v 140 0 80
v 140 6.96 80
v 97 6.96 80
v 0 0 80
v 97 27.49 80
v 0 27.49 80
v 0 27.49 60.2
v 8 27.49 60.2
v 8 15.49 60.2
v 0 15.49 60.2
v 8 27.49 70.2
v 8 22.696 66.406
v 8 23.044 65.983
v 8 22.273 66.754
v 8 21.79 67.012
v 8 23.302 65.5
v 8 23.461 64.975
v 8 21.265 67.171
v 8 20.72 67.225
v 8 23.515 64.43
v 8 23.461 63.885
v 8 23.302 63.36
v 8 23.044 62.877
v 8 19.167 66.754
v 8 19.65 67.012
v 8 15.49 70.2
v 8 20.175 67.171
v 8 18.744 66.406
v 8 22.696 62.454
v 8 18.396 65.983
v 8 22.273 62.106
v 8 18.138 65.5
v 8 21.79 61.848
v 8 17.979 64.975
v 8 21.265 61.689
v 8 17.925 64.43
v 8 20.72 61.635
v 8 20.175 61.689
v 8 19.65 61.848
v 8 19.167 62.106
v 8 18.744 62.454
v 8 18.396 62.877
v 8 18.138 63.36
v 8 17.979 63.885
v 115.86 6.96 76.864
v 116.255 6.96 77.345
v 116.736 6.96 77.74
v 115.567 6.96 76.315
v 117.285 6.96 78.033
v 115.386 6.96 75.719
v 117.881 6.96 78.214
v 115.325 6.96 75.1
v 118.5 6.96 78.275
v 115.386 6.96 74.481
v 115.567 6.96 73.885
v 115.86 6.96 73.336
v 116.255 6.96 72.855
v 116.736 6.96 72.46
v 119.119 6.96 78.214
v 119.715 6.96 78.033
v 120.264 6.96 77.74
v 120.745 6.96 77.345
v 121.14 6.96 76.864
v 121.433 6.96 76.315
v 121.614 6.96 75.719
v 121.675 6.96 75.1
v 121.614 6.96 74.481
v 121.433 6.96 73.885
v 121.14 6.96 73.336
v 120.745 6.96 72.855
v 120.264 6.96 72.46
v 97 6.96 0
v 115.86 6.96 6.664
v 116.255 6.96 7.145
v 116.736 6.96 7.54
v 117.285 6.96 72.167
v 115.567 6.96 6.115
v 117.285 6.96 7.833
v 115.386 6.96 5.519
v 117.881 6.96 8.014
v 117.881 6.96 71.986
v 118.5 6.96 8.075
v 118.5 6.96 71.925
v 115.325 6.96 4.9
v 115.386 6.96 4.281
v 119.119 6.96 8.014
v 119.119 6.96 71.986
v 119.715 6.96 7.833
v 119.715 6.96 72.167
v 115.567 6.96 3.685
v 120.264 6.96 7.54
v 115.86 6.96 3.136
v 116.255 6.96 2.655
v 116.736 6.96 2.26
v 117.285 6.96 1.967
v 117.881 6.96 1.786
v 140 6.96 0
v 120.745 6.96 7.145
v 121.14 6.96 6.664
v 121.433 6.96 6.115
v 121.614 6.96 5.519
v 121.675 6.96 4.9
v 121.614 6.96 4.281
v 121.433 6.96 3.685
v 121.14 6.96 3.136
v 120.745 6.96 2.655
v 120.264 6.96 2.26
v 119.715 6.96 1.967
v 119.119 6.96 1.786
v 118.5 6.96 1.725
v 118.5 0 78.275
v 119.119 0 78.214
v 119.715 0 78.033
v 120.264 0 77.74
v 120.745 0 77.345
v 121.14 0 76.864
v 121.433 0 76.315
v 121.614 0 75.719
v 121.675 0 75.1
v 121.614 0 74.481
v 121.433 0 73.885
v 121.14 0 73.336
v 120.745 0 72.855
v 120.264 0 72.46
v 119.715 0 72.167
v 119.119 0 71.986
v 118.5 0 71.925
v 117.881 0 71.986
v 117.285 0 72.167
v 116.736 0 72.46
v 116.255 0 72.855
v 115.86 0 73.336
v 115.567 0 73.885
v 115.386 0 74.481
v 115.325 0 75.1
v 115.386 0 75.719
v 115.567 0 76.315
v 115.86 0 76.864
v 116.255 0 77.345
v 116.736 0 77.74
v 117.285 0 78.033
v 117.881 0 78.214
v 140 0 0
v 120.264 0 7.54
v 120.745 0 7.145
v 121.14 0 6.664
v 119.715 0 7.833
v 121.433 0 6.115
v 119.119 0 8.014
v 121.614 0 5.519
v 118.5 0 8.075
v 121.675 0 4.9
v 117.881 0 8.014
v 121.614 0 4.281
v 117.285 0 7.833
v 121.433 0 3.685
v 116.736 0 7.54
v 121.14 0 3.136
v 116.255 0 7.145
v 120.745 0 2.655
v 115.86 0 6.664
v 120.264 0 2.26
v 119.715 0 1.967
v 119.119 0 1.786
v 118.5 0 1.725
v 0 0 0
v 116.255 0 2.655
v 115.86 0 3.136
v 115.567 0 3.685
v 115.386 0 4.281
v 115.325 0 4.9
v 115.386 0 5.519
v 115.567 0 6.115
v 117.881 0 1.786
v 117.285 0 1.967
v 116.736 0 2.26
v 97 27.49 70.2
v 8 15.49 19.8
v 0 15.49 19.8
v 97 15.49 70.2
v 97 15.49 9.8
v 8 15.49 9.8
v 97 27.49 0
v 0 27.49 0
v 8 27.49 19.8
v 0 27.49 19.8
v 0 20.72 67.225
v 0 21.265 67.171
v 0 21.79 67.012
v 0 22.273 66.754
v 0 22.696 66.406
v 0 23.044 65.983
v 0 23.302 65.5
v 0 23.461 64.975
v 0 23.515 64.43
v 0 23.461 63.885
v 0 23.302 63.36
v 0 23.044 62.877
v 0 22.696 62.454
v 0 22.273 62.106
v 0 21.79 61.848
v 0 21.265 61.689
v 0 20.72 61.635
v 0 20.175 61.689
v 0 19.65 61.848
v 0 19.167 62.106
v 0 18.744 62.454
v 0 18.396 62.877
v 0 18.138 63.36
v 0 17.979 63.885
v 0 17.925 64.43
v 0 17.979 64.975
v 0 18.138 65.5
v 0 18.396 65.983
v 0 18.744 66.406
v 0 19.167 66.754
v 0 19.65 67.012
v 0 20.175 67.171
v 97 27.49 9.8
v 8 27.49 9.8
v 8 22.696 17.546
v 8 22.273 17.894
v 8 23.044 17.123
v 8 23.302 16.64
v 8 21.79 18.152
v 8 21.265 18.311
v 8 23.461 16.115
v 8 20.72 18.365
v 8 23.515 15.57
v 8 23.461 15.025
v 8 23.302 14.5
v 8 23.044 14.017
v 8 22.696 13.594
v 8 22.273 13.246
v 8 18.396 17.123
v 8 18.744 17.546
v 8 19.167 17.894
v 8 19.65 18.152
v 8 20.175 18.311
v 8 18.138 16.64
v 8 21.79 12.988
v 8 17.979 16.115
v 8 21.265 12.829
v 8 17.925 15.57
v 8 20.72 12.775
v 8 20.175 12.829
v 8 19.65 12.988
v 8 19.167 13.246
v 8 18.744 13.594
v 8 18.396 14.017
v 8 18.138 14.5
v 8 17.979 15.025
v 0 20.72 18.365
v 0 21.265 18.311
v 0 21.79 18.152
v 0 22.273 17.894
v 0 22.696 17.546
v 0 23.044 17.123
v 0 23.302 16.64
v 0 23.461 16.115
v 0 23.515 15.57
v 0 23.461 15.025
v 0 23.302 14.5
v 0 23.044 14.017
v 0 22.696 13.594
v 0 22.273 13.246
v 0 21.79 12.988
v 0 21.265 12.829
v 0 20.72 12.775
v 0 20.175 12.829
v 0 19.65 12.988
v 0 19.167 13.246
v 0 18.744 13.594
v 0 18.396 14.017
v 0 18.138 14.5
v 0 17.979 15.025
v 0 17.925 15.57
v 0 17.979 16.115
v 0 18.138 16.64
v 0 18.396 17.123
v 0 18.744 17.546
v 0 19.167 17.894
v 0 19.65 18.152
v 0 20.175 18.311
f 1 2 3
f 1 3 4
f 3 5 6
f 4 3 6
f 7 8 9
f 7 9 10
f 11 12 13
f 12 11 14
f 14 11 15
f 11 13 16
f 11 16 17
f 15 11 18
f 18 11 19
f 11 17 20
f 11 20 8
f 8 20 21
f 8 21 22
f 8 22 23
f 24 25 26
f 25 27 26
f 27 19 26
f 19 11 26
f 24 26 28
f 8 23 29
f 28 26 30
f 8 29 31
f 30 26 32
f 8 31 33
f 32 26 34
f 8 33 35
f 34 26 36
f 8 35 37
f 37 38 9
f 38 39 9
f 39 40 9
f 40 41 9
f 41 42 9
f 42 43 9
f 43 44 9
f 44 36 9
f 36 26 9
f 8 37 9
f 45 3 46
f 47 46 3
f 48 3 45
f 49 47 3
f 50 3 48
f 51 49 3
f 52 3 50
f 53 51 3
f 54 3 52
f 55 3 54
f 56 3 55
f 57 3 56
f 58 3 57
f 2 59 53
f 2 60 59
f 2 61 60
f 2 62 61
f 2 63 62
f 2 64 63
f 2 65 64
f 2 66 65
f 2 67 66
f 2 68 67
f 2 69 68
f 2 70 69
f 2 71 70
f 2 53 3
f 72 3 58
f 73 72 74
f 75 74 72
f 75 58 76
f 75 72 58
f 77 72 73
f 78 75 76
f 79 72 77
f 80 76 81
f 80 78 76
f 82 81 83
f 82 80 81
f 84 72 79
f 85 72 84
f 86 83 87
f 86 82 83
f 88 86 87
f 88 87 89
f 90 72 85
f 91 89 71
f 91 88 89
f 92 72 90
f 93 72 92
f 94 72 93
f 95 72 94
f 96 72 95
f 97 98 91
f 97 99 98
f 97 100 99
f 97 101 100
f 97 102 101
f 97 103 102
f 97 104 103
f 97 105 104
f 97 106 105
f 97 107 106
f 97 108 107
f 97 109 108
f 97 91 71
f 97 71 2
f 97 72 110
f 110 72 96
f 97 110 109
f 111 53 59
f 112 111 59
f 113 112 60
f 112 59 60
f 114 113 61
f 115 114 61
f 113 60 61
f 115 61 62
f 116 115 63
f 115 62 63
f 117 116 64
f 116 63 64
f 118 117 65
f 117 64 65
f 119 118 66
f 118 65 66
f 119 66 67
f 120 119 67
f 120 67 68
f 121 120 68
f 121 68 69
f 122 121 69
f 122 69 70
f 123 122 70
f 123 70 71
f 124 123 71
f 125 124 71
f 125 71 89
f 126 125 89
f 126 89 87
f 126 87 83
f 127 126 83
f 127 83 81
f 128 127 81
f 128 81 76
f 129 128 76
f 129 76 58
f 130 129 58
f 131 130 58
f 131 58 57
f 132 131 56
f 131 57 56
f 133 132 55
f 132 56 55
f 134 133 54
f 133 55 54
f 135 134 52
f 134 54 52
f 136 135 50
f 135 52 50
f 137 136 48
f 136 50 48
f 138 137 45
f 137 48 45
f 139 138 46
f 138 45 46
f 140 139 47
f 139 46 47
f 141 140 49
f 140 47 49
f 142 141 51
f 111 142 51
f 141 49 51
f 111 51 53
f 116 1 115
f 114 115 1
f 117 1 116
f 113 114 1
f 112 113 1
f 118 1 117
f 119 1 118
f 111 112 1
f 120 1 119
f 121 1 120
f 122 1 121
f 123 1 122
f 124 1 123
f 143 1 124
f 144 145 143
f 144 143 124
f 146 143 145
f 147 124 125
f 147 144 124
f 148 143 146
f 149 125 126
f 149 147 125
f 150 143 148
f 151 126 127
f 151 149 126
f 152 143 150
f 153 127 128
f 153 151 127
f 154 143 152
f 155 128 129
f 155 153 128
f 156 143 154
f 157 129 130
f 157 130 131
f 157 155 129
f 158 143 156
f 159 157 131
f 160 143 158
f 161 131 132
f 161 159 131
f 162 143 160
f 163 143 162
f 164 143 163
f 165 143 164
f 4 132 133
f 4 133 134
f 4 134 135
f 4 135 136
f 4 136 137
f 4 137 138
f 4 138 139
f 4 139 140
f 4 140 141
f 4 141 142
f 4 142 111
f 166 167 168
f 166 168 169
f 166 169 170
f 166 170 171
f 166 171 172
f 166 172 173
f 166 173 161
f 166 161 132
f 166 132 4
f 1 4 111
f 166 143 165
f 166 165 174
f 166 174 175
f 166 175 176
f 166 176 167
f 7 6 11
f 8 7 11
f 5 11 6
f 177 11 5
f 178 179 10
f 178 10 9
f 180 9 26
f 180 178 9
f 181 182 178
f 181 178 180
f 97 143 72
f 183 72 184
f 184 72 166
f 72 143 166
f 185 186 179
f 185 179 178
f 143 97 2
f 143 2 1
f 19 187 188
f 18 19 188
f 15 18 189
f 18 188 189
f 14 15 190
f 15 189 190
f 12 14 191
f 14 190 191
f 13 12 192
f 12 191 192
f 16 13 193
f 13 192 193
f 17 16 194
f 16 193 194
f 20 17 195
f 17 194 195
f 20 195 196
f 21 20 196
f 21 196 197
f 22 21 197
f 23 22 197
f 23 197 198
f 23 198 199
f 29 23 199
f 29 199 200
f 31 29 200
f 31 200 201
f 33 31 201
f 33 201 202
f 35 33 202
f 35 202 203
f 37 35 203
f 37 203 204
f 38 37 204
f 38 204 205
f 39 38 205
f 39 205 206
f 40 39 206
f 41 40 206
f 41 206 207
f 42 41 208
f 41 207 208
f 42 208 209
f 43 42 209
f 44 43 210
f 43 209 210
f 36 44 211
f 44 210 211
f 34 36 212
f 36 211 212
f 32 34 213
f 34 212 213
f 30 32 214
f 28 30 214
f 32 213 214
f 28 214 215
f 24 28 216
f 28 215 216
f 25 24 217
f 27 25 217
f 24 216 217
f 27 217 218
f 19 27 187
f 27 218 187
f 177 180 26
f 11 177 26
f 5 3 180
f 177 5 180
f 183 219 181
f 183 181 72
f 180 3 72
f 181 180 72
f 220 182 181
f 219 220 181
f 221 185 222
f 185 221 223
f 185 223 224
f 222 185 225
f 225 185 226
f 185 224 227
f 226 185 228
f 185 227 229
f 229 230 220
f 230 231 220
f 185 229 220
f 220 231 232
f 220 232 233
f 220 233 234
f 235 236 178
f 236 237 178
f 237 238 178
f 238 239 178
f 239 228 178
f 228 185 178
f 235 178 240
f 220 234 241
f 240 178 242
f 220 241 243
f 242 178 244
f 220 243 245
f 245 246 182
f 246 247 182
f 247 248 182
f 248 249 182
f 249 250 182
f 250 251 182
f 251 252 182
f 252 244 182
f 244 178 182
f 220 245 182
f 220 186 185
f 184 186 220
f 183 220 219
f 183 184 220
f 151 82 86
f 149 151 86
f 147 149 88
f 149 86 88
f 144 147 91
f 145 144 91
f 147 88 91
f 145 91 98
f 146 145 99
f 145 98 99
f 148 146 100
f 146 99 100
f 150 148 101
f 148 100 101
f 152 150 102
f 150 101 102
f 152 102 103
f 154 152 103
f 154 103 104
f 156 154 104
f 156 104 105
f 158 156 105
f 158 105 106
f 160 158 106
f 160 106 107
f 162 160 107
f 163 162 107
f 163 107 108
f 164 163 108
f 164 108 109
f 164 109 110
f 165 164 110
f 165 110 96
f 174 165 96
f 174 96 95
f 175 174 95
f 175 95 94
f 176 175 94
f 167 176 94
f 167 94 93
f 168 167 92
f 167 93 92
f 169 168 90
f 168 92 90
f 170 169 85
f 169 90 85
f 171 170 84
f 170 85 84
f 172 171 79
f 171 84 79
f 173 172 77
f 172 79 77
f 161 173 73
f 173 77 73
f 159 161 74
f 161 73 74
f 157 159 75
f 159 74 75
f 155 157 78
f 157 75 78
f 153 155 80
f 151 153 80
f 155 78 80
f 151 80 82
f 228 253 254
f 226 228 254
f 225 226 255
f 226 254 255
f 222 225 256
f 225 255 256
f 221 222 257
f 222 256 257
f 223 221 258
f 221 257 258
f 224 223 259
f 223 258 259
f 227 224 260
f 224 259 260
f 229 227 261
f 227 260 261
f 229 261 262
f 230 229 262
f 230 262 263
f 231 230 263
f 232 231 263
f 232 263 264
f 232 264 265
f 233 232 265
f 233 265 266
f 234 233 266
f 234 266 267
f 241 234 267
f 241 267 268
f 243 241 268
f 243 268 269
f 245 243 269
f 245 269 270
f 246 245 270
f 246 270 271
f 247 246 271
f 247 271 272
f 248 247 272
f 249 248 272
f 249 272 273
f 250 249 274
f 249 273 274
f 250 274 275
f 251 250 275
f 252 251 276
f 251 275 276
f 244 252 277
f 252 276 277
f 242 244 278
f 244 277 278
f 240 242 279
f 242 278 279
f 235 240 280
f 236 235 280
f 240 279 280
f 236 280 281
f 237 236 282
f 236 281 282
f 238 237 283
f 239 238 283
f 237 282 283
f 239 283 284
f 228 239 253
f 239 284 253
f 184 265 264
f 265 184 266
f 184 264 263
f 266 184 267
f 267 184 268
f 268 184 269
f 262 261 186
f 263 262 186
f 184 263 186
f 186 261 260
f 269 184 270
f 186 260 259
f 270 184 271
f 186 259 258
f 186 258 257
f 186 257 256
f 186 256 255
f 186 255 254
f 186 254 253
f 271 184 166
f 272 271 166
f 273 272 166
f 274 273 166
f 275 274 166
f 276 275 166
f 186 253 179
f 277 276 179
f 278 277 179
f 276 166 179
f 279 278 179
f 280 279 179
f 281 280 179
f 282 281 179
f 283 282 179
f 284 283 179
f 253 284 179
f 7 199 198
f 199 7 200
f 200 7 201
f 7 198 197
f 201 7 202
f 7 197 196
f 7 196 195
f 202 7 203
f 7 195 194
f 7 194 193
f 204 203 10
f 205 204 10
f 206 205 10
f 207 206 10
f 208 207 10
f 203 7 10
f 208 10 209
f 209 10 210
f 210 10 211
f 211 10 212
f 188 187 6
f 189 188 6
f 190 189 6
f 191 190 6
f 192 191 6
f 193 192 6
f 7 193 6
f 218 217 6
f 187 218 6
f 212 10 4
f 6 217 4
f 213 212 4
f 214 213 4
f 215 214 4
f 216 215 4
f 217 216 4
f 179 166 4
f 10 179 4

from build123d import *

# Parameters (mm, degrees)
BOSS_EXTRUDE1_DEPTH = 80
BOSS_EXTRUDE2_DEPTH = 12
SKETCH3_R           = 2.795
CUT_EXTRUDE1_DEPTH  = 60
SKETCH4_R           = 3.175
CUT_EXTRUDE2_DEPTH  = 10


with BuildPart() as part:
    # Sketch1 → Boss-Extrude1 (new body)
    with BuildSketch(Plane.XY):
        Polygon((140, 0), (0, 0), (0, 15.49), (97, 15.49), (97, 6.96), (140, 6.96), align=None)
    extrude(amount=BOSS_EXTRUDE1_DEPTH)

    # Sketch2 → Boss-Extrude2 (add)
    with BuildSketch(Plane(origin=(0, 15.49, 0), x_dir=(1, 0, 0), z_dir=(0, 1, 0))):
        Polygon((97, 0), (0, 0), (0, -9.8), (0, -19.8), (8, -19.8), (8, -9.8), (97, -9.8), align=None)
        Polygon((8, -60.2), (0, -60.2), (0, -70.2), (0, -80), (97, -80), (97, -70.2), (8, -70.2), align=None)
    extrude(amount=BOSS_EXTRUDE2_DEPTH)

    # Sketch3 → Cut-Extrude1 (cut)
    with BuildSketch(Plane.ZY):
        with Locations((15.57, 20.72)):
            Circle(SKETCH3_R)
        with Locations((64.43, 20.72)):
            Circle(SKETCH3_R)
    extrude(amount=-CUT_EXTRUDE1_DEPTH, mode=Mode.SUBTRACT)

    # Sketch4 → Cut-Extrude2 (cut)
    with BuildSketch(Plane(origin=(0, 6.96, 0), x_dir=(1, 0, 0), z_dir=(0, 1, 0))):
        with Locations(Location((118.5, -4.9, 0), (0, 0, 270))):
            Circle(SKETCH4_R)
        with Locations(Location((118.5, -75.1, 0), (0, 0, 270))):
            Circle(SKETCH4_R)
    extrude(amount=-CUT_EXTRUDE2_DEPTH, mode=Mode.SUBTRACT)


solid = part.part
